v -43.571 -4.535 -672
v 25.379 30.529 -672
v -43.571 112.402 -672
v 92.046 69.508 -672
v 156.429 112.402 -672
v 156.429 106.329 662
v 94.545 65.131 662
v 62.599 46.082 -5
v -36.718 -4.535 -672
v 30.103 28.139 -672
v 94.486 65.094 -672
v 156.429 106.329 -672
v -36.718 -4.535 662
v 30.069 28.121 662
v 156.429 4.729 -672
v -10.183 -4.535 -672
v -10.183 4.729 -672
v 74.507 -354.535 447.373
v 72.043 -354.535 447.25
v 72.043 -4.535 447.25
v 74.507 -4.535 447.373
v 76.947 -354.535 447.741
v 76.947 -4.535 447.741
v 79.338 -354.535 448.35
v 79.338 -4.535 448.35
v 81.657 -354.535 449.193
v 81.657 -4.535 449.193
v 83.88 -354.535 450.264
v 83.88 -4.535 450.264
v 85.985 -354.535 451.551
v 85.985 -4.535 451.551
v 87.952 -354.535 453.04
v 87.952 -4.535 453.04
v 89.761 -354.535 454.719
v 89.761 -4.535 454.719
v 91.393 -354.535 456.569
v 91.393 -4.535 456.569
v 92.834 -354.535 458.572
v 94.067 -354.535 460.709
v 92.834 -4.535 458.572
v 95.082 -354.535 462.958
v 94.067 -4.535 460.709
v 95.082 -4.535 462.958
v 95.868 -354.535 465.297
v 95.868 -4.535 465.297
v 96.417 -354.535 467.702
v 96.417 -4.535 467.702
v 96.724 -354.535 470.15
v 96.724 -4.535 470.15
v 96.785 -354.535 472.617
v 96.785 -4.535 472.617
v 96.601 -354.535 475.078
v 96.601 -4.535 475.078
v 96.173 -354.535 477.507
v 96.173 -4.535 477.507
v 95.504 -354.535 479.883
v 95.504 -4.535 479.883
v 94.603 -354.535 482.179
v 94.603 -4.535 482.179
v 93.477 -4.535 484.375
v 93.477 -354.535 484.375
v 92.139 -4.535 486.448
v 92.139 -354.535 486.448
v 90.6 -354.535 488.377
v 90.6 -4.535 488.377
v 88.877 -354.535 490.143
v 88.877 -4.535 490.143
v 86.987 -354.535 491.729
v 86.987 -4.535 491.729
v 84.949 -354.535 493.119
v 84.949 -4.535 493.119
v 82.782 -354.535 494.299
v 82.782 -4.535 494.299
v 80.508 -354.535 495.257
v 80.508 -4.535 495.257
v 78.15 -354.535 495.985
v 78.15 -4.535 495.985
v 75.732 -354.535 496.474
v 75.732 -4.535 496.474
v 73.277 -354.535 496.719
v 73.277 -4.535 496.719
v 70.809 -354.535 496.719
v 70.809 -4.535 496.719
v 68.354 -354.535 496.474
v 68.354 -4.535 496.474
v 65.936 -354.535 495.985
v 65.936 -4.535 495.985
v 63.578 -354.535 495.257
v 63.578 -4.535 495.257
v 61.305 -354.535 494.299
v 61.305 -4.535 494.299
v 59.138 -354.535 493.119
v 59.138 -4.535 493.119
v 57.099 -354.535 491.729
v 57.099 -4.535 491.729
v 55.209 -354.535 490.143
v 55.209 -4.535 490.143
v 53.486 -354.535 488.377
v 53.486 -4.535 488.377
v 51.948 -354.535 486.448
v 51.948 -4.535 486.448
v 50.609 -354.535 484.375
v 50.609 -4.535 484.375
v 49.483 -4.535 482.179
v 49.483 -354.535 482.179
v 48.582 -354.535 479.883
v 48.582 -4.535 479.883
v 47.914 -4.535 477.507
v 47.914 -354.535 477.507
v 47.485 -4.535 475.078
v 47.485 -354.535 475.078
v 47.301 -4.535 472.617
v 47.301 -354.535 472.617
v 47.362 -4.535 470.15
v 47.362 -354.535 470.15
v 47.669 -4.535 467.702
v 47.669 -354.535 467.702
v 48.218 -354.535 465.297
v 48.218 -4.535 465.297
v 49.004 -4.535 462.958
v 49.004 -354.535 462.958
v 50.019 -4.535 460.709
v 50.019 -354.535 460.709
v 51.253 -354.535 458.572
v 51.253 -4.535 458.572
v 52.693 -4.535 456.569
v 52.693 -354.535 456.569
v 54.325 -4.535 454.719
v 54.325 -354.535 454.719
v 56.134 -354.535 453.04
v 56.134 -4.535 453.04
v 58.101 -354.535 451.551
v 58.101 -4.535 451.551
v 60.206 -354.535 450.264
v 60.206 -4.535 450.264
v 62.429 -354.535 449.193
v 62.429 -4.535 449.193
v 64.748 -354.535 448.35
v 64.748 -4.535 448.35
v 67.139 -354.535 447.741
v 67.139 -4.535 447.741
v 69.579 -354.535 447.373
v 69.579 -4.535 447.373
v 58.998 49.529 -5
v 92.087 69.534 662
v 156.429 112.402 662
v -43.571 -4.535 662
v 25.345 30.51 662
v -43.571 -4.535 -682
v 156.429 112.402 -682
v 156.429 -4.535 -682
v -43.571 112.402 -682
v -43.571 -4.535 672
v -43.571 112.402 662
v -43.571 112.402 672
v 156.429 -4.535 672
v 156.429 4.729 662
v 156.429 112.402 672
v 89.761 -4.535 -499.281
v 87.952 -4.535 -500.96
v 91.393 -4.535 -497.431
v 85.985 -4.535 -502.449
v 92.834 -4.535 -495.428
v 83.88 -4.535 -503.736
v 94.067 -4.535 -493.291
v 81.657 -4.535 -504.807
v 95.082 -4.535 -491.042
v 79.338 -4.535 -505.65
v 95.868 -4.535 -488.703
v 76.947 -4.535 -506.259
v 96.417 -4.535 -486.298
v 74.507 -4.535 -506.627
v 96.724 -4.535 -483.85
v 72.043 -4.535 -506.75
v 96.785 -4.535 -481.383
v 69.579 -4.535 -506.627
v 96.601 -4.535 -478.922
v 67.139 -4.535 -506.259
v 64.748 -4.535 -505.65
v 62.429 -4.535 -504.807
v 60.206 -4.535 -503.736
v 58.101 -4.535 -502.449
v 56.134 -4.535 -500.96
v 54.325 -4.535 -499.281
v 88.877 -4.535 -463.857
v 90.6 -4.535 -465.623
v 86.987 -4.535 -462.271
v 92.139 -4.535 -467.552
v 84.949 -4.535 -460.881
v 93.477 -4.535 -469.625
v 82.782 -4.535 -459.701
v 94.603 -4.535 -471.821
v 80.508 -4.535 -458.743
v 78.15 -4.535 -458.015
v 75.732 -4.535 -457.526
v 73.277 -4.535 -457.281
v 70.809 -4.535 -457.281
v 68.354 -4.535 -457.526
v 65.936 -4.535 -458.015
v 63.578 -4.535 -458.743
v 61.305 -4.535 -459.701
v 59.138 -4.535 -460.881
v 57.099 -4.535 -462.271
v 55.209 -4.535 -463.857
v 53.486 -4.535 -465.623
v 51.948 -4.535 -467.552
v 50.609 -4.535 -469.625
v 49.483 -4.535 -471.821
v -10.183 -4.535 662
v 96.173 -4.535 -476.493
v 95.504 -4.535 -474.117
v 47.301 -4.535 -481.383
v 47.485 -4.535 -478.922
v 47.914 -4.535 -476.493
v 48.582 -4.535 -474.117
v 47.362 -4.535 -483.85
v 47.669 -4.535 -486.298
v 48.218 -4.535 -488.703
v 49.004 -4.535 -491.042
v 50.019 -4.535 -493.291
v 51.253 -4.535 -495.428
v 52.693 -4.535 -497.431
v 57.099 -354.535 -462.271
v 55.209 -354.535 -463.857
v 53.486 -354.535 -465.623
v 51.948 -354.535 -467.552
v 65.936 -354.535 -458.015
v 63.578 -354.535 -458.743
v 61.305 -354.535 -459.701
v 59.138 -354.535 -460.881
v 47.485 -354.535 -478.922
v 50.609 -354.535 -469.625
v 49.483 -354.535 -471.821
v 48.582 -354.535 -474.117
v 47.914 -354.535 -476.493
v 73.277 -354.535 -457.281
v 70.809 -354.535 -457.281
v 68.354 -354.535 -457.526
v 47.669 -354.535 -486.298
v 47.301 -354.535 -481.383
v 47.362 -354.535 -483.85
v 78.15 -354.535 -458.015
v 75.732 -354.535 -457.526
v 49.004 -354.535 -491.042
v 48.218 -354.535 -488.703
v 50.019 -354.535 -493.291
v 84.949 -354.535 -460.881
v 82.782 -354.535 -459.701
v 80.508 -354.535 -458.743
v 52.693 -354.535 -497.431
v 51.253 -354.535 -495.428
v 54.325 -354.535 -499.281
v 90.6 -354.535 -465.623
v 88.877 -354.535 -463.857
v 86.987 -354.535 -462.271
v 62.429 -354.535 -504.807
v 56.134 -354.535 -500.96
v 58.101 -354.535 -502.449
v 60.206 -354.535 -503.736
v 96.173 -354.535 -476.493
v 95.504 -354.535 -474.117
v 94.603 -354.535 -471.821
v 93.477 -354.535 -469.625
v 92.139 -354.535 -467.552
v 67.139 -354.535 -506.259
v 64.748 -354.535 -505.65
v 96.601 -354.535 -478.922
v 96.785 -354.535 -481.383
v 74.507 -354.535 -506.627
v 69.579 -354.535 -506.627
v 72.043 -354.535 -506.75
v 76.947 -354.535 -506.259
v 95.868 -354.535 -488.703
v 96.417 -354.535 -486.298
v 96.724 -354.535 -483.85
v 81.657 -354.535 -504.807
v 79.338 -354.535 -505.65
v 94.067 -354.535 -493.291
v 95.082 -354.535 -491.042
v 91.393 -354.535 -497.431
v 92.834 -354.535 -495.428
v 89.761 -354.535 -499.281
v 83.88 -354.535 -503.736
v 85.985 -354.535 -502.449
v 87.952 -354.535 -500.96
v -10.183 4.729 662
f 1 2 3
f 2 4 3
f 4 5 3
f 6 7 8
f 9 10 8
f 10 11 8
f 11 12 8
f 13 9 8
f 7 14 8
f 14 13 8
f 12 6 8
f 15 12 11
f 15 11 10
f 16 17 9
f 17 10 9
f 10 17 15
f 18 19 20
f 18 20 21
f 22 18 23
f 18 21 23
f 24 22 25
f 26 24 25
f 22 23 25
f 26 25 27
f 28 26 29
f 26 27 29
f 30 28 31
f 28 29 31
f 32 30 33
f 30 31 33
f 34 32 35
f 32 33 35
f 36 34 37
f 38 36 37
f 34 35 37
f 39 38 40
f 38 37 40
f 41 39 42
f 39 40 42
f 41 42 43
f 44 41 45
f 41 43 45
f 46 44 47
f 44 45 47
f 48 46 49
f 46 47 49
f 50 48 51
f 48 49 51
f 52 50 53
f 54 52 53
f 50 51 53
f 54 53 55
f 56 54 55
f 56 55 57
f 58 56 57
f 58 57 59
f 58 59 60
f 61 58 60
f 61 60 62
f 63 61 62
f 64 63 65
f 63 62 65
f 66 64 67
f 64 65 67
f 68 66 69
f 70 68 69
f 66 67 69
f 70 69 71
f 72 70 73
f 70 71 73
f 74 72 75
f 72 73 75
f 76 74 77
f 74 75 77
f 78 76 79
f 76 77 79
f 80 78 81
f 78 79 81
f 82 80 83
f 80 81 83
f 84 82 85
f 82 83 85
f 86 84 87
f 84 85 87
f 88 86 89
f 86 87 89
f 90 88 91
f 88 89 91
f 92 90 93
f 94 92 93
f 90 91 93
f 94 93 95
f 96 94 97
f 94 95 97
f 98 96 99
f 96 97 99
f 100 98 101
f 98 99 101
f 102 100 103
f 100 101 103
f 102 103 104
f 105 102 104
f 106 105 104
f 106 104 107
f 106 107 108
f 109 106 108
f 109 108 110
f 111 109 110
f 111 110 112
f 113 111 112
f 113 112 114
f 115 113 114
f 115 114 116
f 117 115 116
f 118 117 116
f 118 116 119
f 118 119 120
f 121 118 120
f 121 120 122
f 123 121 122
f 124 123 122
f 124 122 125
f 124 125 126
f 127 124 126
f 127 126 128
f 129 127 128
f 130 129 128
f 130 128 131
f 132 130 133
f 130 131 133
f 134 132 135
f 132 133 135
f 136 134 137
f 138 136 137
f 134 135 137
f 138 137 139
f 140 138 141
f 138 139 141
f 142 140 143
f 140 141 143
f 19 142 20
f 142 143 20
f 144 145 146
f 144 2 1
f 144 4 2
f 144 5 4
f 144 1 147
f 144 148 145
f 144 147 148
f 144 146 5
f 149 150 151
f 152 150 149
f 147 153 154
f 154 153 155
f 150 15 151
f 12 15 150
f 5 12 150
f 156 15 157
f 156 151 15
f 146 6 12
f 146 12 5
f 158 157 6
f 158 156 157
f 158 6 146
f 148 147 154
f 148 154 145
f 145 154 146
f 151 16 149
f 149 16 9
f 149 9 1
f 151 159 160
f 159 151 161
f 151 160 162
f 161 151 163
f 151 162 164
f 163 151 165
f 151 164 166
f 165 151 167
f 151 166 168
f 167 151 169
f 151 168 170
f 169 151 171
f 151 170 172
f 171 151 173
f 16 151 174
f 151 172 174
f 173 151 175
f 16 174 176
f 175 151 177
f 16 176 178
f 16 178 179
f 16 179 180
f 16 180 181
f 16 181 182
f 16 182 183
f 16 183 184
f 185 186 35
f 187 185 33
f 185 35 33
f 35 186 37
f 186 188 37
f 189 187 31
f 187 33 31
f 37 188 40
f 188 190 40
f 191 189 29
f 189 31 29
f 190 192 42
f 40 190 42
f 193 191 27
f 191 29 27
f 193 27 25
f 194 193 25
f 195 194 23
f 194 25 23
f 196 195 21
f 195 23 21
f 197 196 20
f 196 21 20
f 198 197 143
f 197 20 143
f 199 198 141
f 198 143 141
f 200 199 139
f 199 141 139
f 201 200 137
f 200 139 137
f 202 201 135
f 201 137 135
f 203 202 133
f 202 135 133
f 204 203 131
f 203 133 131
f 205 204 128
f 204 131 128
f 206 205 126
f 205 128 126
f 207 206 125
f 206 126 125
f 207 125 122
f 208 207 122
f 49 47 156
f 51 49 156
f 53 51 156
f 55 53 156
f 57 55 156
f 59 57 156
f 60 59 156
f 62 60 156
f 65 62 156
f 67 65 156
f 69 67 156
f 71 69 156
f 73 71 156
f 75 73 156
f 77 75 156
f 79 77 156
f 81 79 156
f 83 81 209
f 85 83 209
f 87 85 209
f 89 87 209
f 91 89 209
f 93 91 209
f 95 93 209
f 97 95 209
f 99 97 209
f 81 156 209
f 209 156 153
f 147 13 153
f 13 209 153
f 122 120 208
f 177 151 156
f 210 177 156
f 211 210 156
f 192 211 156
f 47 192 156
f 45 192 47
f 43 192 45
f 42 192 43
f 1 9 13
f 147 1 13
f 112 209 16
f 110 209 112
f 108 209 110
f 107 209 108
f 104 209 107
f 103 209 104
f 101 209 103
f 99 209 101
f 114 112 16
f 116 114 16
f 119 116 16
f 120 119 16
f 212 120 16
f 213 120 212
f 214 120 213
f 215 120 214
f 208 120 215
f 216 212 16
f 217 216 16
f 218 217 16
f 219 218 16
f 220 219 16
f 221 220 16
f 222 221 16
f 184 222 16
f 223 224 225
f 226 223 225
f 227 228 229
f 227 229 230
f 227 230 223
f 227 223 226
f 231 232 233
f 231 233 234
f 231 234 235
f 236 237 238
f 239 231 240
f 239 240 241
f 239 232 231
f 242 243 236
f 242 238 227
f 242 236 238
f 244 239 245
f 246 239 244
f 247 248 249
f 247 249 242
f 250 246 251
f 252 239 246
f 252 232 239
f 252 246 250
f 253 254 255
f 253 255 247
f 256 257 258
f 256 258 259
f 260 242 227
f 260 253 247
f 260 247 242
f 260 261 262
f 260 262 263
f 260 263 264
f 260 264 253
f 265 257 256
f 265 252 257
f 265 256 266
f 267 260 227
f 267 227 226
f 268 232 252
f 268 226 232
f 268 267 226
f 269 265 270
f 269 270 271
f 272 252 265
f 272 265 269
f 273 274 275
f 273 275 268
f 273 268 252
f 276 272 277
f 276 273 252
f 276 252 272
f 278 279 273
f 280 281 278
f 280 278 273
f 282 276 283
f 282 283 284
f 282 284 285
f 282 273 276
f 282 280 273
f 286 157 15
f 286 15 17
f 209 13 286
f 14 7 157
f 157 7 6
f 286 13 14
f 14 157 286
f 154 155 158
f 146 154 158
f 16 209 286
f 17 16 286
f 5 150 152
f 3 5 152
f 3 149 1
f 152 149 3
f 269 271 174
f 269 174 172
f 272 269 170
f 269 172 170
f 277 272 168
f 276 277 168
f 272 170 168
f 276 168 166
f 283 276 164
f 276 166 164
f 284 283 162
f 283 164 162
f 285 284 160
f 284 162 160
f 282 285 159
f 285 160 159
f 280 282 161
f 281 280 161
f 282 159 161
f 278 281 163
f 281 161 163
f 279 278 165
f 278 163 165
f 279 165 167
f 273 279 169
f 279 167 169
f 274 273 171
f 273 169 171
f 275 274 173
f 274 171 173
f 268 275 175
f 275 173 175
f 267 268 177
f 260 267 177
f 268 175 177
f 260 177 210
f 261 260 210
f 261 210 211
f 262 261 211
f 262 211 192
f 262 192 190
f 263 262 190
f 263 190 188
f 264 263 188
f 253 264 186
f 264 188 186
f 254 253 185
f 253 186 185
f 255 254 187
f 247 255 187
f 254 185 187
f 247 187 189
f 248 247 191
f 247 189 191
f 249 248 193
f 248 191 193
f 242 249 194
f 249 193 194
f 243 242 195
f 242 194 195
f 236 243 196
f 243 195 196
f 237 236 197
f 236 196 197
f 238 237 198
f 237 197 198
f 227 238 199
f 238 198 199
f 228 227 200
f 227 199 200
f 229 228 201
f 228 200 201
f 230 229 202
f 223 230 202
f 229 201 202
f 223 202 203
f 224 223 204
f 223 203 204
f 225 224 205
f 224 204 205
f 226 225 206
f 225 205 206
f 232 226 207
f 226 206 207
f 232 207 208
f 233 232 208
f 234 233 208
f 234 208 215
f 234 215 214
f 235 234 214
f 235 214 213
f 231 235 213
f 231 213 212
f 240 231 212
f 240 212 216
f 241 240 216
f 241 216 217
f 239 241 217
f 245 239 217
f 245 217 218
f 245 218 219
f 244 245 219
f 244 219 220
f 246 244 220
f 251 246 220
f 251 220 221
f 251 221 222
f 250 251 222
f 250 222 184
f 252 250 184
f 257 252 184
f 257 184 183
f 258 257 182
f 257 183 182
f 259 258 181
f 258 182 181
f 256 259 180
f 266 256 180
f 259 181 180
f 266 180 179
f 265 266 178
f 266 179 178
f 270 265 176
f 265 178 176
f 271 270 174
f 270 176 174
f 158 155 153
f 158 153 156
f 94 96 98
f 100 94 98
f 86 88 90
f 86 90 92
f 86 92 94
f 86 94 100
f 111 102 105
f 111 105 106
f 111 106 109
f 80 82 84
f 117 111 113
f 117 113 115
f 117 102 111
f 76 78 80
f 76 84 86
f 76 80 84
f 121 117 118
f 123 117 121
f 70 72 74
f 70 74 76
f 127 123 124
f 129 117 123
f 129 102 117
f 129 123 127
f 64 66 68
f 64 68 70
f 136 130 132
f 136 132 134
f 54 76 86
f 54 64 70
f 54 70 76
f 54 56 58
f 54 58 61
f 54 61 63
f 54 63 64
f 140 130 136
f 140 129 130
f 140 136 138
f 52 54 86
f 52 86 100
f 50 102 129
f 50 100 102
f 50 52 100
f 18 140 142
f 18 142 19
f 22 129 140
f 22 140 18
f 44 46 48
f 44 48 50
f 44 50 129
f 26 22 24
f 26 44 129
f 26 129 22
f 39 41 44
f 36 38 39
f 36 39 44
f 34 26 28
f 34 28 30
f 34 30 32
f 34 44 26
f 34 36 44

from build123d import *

# Parameters (mm, degrees)
BOSS_EXTRUDE1_DEPTH      = 672
BOSS_EXTRUDE1_DEPTH_BACK = 672
SKETCH2_W                = 200
SKETCH2_H                = 116.93693015
BOSS_EXTRUDE2_DEPTH      = 10
SKETCH3_W                = 166.612048155
SKETCH3_H                = 9.263959568
BOSS_EXTRUDE4_DEPTH      = 1344
SKETCH4_W                = 200
SKETCH4_H                = 116.93693015
BOSS_EXTRUDE5_DEPTH      = 10
SKETCH5_R                = 24.75
BOSS_EXTRUDE6_DEPTH      = 350


with BuildPart() as part:
    # Sketch1 → Boss-Extrude1 (new, two sides: drawn at the far end of the back side and taken through both)
    with BuildSketch(Plane.XY.offset(-BOSS_EXTRUDE1_DEPTH_BACK)):
        with BuildLine():
            Line((156.429158375, 112.402005818), (156.429158375, 106.3293088))
            add(Edge.make_bspline(
                [(-36.718341557, -4.534924332), (65.343074275, 41.2659049), (156.429158375, 106.3293088)],
                knots=[0, 0, 0, 1, 1, 1], degree=2))
            Line((-36.718341557, -4.534924332), (-43.570841625, -4.534924332))
            add(Edge.make_bspline(
                [(-43.570841625, -4.534924332), (61.566048456, 45.124972859), (156.429158375, 112.402005818)],
                knots=[0, 0, 0, 1, 1, 1], degree=2))
        make_face()
    extrude(amount=BOSS_EXTRUDE1_DEPTH + BOSS_EXTRUDE1_DEPTH_BACK)

    # Sketch2 → Boss-Extrude2 (add)
    with BuildSketch(Plane.XY.offset(672)):
        with Locations((56.429158375, 53.933540743)):
            Rectangle(SKETCH2_W, SKETCH2_H)
    extrude(amount=-BOSS_EXTRUDE2_DEPTH)

    # Sketch3 → Boss-Extrude4 (add)
    with BuildSketch(Plane(origin=(0, 0, 662), x_dir=(-1, 0, 0), z_dir=(0, 0, -1))):
        with Locations((-73.123134298, 0.097055452)):
            Rectangle(SKETCH3_W, SKETCH3_H)
    extrude(amount=BOSS_EXTRUDE4_DEPTH)

    # Sketch4 → Boss-Extrude5 (add)
    with BuildSketch(Plane(origin=(0, 0, -682), x_dir=(-1, 0, 0), z_dir=(0, 0, -1))):
        with Locations((-56.429158375, 53.933540743)):
            Rectangle(SKETCH4_W, SKETCH4_H)
    extrude(amount=-BOSS_EXTRUDE5_DEPTH)

    # Sketch5 → Boss-Extrude6 (add)
    with BuildSketch(Plane.XZ.offset(4.534924332)):
        with Locations((72.043158776, 472)):
            Circle(SKETCH5_R)
        with Locations((72.043158776, -482)):
            Circle(SKETCH5_R)
    extrude(amount=BOSS_EXTRUDE6_DEPTH)


solid = part.part
